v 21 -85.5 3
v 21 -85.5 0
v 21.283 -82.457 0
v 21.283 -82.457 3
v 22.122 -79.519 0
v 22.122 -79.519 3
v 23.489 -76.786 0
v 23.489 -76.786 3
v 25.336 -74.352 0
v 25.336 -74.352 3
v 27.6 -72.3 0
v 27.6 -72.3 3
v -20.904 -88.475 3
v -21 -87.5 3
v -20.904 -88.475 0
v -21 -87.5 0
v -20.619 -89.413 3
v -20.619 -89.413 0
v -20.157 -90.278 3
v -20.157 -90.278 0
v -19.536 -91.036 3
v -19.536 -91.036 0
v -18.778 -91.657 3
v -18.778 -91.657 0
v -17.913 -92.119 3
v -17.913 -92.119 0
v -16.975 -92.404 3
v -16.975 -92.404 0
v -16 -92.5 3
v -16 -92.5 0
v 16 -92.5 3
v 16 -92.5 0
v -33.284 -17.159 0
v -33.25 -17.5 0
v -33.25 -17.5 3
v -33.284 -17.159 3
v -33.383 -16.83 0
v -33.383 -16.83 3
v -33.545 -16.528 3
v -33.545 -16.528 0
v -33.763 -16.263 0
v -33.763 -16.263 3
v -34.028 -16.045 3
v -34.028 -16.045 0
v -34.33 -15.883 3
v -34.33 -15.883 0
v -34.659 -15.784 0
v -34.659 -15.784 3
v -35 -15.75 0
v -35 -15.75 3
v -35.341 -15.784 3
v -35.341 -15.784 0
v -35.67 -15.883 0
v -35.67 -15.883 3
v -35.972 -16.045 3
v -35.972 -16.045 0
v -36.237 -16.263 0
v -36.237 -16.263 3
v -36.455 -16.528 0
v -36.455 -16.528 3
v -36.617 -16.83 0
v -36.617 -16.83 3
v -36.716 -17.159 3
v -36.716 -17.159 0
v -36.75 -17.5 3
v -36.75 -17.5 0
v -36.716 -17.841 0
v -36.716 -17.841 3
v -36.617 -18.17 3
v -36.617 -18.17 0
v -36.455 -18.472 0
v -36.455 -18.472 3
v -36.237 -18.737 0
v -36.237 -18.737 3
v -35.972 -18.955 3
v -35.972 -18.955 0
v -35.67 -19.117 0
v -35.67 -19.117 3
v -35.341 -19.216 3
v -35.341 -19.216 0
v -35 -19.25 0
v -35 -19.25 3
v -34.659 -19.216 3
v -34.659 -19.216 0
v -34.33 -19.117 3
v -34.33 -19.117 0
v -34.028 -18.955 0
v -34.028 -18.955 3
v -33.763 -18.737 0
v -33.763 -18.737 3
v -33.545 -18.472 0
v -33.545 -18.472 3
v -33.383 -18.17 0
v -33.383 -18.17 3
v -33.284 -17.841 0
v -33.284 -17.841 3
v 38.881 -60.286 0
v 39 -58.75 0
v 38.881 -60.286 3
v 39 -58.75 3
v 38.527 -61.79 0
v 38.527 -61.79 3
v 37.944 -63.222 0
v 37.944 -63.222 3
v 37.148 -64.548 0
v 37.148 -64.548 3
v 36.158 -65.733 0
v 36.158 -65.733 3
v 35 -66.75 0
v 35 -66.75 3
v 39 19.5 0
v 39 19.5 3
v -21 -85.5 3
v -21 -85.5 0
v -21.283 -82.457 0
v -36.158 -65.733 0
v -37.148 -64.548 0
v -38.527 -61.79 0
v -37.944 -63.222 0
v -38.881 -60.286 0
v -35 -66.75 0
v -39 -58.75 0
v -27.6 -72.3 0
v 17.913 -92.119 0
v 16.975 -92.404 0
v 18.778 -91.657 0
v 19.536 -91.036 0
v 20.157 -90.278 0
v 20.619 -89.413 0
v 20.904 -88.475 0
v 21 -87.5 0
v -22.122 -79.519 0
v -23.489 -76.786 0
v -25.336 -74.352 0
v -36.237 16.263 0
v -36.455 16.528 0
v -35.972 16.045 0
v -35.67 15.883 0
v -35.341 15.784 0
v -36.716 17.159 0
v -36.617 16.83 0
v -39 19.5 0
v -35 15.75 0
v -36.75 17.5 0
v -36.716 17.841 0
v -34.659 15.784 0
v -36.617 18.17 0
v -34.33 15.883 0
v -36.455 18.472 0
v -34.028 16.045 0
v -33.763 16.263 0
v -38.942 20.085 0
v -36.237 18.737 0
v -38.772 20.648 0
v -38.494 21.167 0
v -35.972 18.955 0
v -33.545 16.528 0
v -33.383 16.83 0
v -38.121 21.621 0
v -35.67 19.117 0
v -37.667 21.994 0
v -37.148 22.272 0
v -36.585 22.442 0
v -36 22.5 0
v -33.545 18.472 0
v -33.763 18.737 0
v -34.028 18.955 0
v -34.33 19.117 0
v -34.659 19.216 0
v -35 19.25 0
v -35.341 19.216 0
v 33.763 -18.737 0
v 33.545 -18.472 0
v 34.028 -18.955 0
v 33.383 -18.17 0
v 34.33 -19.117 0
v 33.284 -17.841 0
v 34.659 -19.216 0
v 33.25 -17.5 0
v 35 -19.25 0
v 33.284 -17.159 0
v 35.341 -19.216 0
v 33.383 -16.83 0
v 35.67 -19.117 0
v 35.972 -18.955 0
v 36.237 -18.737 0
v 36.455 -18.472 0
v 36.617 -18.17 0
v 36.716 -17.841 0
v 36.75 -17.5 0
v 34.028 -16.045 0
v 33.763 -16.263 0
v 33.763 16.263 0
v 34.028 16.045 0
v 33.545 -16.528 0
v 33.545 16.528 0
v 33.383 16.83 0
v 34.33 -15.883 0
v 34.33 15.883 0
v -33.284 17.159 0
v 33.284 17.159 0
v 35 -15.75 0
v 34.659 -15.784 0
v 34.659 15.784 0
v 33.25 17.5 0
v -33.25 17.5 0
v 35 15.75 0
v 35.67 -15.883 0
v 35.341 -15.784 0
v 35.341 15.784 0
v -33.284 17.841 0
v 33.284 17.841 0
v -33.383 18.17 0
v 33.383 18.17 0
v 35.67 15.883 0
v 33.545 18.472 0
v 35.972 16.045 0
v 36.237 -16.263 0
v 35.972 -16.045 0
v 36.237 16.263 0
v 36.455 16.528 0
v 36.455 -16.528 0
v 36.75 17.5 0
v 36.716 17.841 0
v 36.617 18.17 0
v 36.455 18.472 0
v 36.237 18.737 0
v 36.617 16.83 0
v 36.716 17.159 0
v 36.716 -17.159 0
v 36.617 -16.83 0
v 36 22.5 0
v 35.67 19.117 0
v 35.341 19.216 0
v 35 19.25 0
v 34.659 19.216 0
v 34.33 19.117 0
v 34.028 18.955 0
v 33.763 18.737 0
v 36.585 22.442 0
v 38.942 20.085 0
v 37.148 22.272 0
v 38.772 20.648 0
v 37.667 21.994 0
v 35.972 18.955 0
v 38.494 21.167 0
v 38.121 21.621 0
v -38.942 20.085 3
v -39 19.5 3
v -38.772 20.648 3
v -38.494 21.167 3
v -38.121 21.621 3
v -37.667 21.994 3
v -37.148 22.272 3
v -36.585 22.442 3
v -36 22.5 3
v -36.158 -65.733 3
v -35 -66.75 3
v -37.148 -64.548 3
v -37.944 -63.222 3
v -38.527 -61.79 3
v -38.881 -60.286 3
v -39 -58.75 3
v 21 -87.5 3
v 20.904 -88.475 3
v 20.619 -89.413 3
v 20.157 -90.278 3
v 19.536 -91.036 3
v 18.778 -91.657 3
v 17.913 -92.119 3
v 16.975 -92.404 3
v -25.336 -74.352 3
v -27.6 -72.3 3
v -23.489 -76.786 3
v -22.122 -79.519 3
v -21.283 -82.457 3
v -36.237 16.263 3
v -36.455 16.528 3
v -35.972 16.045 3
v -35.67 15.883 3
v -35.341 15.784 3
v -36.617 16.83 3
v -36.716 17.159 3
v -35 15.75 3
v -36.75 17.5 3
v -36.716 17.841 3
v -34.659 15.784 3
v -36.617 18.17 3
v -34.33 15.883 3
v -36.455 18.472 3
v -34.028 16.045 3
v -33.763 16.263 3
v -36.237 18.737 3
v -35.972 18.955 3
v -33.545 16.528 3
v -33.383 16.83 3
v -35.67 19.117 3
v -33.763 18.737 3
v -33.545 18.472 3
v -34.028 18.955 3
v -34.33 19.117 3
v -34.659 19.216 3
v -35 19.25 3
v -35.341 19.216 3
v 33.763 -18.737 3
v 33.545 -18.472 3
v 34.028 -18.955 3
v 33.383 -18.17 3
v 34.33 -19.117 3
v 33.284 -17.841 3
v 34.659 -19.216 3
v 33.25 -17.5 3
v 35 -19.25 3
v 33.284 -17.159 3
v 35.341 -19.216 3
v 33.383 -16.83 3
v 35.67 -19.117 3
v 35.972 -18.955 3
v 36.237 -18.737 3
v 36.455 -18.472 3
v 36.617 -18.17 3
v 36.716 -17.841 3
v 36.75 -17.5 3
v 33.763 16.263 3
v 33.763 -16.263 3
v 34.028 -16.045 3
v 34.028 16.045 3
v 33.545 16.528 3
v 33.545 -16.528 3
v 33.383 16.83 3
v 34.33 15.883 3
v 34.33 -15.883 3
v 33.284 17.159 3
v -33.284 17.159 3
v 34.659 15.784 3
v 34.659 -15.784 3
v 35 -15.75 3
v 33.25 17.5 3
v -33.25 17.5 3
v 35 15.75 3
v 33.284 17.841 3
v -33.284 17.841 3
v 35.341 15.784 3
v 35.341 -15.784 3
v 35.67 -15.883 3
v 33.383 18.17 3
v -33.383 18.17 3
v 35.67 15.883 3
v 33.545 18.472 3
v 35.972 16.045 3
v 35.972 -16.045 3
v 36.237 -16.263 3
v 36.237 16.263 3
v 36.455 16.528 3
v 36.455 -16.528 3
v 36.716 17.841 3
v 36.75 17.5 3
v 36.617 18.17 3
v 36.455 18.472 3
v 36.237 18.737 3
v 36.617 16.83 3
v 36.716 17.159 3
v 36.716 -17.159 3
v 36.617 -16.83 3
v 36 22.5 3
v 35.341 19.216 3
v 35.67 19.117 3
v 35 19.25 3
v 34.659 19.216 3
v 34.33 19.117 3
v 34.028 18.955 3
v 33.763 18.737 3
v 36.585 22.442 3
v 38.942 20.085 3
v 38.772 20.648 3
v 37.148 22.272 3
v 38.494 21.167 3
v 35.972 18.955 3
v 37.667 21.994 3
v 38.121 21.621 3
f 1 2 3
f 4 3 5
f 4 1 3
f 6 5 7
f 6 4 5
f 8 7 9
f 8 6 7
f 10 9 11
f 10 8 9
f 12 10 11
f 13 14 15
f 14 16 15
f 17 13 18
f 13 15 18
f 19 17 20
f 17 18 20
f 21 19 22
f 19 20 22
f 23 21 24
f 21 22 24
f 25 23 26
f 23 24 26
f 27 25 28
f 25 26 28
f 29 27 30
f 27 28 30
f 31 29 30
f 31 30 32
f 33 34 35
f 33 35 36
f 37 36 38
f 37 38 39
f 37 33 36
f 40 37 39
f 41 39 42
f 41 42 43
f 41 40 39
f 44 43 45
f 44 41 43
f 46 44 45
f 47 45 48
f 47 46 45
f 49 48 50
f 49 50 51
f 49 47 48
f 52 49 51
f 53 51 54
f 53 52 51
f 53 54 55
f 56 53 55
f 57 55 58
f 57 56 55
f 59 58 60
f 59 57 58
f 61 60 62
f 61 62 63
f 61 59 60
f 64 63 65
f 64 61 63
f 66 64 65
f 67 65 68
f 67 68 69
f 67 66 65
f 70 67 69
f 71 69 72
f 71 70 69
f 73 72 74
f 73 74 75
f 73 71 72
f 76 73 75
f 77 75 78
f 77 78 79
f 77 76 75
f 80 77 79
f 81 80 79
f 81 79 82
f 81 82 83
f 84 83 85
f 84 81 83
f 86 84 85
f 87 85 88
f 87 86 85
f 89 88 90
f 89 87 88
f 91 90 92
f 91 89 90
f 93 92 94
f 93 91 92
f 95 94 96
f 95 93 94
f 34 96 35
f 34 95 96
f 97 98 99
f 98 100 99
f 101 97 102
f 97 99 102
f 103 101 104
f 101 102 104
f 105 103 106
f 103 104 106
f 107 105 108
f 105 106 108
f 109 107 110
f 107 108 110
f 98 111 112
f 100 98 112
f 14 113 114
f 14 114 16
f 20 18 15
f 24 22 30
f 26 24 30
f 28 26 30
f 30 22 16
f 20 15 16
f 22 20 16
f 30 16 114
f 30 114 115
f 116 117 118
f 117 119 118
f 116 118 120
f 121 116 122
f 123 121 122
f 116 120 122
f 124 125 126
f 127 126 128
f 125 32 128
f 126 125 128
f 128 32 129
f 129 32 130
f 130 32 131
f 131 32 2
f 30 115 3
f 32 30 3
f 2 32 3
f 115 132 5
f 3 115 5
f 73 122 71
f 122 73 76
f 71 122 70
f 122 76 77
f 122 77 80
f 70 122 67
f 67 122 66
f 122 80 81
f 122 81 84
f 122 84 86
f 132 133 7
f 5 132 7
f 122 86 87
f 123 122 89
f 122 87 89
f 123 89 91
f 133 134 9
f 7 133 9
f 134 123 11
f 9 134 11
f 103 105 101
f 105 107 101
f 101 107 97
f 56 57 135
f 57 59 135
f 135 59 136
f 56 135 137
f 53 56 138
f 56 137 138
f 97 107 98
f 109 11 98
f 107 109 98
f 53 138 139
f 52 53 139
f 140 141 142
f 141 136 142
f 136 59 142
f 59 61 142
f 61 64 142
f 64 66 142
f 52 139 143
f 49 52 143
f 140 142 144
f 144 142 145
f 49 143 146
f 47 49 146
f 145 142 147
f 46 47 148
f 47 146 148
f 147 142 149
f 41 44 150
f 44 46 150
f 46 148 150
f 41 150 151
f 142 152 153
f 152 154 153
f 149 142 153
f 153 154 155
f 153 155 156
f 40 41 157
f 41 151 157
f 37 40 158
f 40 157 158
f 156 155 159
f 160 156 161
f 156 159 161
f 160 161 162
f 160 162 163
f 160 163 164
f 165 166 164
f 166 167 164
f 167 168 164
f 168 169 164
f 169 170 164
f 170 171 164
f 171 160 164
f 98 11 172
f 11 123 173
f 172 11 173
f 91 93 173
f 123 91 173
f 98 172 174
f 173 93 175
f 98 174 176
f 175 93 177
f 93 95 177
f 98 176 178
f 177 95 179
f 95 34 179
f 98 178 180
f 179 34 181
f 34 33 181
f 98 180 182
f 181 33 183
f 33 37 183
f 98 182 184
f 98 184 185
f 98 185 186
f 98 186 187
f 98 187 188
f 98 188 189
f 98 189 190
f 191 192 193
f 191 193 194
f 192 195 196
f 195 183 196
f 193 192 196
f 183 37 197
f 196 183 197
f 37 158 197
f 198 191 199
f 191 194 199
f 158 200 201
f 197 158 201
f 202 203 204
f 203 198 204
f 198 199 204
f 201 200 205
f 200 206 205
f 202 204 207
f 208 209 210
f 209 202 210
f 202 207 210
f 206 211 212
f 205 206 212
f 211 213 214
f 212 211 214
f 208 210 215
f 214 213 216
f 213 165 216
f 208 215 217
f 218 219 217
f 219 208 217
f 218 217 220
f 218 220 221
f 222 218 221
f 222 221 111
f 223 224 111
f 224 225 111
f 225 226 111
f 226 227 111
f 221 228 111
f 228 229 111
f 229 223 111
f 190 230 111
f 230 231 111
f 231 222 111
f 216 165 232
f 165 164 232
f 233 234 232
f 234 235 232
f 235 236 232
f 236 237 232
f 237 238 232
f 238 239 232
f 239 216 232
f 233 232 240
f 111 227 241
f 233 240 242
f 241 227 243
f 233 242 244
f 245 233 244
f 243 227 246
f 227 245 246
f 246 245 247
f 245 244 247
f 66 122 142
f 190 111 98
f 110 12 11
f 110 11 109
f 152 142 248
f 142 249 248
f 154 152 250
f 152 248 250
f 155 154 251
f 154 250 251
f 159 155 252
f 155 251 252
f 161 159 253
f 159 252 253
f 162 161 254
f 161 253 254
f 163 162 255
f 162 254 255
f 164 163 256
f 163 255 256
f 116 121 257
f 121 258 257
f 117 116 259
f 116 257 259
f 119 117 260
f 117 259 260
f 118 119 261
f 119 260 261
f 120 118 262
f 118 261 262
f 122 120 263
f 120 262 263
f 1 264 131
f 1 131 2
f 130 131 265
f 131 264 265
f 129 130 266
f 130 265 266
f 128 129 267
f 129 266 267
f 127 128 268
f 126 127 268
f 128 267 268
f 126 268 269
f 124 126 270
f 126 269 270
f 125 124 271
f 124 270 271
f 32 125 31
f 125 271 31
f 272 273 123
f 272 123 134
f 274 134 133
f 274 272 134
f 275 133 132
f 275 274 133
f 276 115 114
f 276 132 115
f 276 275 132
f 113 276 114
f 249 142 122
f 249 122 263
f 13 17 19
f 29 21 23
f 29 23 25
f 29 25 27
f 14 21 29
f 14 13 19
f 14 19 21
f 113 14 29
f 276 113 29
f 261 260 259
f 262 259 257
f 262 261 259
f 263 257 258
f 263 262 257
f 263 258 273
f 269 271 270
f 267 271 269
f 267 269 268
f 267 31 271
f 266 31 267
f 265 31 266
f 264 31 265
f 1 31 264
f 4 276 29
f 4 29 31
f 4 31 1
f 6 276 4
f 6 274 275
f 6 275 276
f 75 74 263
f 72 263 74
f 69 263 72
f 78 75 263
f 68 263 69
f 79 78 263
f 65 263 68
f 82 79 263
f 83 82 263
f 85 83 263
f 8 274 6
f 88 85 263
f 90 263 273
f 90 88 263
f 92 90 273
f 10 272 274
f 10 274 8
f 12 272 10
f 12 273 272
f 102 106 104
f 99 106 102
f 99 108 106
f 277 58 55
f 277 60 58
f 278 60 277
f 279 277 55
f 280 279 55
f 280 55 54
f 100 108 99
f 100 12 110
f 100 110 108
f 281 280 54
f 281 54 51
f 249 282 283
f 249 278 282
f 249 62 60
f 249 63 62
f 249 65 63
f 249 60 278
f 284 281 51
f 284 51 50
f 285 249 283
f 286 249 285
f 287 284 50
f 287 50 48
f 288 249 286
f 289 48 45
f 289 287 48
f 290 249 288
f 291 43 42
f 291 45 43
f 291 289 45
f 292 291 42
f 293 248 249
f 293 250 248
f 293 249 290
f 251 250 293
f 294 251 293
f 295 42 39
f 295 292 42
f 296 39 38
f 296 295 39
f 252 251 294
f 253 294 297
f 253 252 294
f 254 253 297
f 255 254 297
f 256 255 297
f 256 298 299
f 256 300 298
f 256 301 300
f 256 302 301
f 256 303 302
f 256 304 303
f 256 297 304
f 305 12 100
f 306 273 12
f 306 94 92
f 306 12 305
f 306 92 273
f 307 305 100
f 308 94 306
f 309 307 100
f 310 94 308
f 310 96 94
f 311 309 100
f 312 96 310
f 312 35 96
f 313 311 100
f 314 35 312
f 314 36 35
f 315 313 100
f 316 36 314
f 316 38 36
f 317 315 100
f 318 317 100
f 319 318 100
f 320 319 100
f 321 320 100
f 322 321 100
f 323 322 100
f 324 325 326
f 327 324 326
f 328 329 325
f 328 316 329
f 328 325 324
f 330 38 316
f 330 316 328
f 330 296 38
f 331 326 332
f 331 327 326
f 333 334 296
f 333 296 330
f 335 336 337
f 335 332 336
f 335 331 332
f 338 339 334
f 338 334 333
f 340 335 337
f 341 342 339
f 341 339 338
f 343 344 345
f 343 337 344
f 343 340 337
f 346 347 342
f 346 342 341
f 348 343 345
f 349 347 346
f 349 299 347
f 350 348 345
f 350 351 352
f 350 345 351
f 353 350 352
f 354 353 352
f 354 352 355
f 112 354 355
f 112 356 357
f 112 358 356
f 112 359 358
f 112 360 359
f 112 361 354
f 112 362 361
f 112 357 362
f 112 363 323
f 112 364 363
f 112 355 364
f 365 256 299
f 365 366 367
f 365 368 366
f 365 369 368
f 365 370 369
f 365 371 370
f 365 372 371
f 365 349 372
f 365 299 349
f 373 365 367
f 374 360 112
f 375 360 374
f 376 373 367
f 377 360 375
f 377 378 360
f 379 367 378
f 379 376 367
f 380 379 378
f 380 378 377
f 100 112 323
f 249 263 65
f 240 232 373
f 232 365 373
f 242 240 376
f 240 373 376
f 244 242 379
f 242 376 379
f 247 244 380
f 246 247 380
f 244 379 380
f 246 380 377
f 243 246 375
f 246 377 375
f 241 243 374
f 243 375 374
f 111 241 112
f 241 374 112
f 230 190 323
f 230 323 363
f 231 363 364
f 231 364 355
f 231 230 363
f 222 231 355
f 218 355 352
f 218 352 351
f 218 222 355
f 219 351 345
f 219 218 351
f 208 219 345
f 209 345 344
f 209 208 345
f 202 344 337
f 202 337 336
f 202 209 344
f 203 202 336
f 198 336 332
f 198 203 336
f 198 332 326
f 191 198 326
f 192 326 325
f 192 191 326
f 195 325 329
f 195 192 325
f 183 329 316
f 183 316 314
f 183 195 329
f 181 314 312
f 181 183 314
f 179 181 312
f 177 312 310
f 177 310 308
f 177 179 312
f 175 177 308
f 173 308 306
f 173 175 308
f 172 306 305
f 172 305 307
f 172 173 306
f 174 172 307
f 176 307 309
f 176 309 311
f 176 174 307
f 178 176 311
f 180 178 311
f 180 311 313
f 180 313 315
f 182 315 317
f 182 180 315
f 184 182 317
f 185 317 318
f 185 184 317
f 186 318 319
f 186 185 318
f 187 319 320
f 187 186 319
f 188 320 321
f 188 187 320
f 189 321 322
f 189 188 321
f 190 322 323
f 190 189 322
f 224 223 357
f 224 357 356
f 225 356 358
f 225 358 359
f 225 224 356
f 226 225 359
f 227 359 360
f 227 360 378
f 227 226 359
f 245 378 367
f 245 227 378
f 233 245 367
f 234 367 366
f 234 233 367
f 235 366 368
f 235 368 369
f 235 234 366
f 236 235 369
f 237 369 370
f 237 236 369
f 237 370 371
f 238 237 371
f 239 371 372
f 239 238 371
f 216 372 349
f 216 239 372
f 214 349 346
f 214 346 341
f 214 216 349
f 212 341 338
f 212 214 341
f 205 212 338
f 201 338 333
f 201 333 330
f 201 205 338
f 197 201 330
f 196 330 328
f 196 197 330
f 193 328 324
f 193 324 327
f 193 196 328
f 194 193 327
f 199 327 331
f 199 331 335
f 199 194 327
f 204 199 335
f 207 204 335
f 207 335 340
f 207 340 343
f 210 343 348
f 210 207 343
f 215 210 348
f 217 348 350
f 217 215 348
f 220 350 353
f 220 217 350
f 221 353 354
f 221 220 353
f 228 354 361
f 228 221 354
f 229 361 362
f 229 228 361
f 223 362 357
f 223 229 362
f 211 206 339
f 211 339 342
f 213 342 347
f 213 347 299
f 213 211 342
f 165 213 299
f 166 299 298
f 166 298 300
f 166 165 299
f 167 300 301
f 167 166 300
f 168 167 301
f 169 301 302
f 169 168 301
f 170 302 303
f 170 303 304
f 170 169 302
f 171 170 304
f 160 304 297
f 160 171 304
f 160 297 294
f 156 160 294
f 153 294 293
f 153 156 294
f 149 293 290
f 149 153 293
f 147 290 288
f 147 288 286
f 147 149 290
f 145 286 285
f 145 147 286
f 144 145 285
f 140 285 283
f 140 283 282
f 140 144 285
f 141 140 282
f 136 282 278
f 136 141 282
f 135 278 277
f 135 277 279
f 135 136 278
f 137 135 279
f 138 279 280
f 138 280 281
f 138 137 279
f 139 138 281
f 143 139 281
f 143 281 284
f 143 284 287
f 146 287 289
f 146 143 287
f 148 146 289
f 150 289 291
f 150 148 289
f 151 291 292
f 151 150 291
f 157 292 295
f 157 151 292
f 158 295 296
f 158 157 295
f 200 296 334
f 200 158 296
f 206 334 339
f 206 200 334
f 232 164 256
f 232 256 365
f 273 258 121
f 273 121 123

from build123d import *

# Parameters (mm, degrees)
SKETCH1_W           = 78
SKETCH1_H           = 45
SKETCH1_R           = 1.75
BOSS_EXTRUDE1_DEPTH = 3
SKETCH2_W           = 78
SKETCH2_H           = 3
BOSS_EXTRUDE2_DEPTH = 70
CUT_EXTRUDE1_DEPTH  = 101.430324106
FILLET1_R           = 5
FILLET2_R           = 10
FILLET3_R           = 3


with BuildPart() as part:
    # Sketch1 → Boss-Extrude1 (new body)
    with BuildSketch(Plane.XY):
        Rectangle(SKETCH1_W, SKETCH1_H)
        with Locations((-35, 17.5)):
            Circle(SKETCH1_R, mode=Mode.SUBTRACT)
        with Locations((35, 17.5)):
            Circle(SKETCH1_R, mode=Mode.SUBTRACT)
        with Locations((35, -17.5)):
            Circle(SKETCH1_R, mode=Mode.SUBTRACT)
        with Locations((-35, -17.5)):
            Circle(SKETCH1_R, mode=Mode.SUBTRACT)
    extrude(amount=BOSS_EXTRUDE1_DEPTH)

    # Sketch2 → Boss-Extrude2 (add)
    with BuildSketch(Plane.XZ.offset(22.5)):
        with Locations((0, 1.5)):
            Rectangle(SKETCH2_W, SKETCH2_H)
    extrude(amount=BOSS_EXTRUDE2_DEPTH)

    # Sketch3 → Cut-Extrude1 (cut, through all)
    with BuildSketch(Plane.XY.offset(3)):
        with BuildLine():
            Line((41, -36.924564207), (91.469533364, -36.924564207))
            Line((91.469533364, -36.924564207), (78.54293296, -118.649611561))
            Line((78.54293296, -118.649611561), (-67.027042434, -120.25516276))
            Line((-67.027042434, -120.25516276), (-84.509711048, -42.475126887))
            Line((-84.509711048, -42.475126887), (-81.655397805, -36.924564207))
            Line((-81.655397805, -36.924564207), (-41, -36.924564207))
            Line((-41, -36.924564207), (-41, -55.5))
            ThreePointArc((-41, -55.5), (-39.574767078, -61.537383539), (-35.6, -66.3))
            Line((-35.6, -66.3), (-27.6, -72.3))
            ThreePointArc((-27.6, -72.3), (-22.741951349, -78.120975674), (-21, -85.5))
            Line((-21, -85.5), (-21, -101))
            ThreePointArc((-21, -101), (-19.389087297, -104.889087297), (-15.5, -106.5))
            Line((-15.5, -106.5), (15.5, -106.5))
            ThreePointArc((15.5, -106.5), (19.389087297, -104.889087297), (21, -101))
            Line((21, -101), (21, -85.5))
            ThreePointArc((21, -85.5), (22.741951349, -78.120975674), (27.6, -72.3))
            Line((27.6, -72.3), (35.6, -66.3))
            ThreePointArc((35.6, -66.3), (39.574767078, -61.537383539), (41, -55.5))
            Line((41, -55.5), (41, -36.924564207))
        make_face()
    extrude(amount=-CUT_EXTRUDE1_DEPTH, mode=Mode.SUBTRACT)

    # Fillet1
    fillet1_edges = [part.edges().sort_by_distance(p)[0] for p in [
        (21, -92.5, 1.5),
        (-21, -92.5, 1.5),
    ]]
    fillet(fillet1_edges, radius=FILLET1_R)

    # Fillet2
    fillet2_edges = [part.edges().sort_by_distance(p)[0] for p in [
        (39, -62.571067812, 1.5),
        (-39, -62.571067812, 1.5),
    ]]
    fillet(fillet2_edges, radius=FILLET2_R)

    # Fillet3
    fillet3_edges = [part.edges().sort_by_distance(p)[0] for p in [
        (-39, 22.5, 1.5),
        (39, 22.5, 1.5),
    ]]
    fillet(fillet3_edges, radius=FILLET3_R)


solid = part.part
